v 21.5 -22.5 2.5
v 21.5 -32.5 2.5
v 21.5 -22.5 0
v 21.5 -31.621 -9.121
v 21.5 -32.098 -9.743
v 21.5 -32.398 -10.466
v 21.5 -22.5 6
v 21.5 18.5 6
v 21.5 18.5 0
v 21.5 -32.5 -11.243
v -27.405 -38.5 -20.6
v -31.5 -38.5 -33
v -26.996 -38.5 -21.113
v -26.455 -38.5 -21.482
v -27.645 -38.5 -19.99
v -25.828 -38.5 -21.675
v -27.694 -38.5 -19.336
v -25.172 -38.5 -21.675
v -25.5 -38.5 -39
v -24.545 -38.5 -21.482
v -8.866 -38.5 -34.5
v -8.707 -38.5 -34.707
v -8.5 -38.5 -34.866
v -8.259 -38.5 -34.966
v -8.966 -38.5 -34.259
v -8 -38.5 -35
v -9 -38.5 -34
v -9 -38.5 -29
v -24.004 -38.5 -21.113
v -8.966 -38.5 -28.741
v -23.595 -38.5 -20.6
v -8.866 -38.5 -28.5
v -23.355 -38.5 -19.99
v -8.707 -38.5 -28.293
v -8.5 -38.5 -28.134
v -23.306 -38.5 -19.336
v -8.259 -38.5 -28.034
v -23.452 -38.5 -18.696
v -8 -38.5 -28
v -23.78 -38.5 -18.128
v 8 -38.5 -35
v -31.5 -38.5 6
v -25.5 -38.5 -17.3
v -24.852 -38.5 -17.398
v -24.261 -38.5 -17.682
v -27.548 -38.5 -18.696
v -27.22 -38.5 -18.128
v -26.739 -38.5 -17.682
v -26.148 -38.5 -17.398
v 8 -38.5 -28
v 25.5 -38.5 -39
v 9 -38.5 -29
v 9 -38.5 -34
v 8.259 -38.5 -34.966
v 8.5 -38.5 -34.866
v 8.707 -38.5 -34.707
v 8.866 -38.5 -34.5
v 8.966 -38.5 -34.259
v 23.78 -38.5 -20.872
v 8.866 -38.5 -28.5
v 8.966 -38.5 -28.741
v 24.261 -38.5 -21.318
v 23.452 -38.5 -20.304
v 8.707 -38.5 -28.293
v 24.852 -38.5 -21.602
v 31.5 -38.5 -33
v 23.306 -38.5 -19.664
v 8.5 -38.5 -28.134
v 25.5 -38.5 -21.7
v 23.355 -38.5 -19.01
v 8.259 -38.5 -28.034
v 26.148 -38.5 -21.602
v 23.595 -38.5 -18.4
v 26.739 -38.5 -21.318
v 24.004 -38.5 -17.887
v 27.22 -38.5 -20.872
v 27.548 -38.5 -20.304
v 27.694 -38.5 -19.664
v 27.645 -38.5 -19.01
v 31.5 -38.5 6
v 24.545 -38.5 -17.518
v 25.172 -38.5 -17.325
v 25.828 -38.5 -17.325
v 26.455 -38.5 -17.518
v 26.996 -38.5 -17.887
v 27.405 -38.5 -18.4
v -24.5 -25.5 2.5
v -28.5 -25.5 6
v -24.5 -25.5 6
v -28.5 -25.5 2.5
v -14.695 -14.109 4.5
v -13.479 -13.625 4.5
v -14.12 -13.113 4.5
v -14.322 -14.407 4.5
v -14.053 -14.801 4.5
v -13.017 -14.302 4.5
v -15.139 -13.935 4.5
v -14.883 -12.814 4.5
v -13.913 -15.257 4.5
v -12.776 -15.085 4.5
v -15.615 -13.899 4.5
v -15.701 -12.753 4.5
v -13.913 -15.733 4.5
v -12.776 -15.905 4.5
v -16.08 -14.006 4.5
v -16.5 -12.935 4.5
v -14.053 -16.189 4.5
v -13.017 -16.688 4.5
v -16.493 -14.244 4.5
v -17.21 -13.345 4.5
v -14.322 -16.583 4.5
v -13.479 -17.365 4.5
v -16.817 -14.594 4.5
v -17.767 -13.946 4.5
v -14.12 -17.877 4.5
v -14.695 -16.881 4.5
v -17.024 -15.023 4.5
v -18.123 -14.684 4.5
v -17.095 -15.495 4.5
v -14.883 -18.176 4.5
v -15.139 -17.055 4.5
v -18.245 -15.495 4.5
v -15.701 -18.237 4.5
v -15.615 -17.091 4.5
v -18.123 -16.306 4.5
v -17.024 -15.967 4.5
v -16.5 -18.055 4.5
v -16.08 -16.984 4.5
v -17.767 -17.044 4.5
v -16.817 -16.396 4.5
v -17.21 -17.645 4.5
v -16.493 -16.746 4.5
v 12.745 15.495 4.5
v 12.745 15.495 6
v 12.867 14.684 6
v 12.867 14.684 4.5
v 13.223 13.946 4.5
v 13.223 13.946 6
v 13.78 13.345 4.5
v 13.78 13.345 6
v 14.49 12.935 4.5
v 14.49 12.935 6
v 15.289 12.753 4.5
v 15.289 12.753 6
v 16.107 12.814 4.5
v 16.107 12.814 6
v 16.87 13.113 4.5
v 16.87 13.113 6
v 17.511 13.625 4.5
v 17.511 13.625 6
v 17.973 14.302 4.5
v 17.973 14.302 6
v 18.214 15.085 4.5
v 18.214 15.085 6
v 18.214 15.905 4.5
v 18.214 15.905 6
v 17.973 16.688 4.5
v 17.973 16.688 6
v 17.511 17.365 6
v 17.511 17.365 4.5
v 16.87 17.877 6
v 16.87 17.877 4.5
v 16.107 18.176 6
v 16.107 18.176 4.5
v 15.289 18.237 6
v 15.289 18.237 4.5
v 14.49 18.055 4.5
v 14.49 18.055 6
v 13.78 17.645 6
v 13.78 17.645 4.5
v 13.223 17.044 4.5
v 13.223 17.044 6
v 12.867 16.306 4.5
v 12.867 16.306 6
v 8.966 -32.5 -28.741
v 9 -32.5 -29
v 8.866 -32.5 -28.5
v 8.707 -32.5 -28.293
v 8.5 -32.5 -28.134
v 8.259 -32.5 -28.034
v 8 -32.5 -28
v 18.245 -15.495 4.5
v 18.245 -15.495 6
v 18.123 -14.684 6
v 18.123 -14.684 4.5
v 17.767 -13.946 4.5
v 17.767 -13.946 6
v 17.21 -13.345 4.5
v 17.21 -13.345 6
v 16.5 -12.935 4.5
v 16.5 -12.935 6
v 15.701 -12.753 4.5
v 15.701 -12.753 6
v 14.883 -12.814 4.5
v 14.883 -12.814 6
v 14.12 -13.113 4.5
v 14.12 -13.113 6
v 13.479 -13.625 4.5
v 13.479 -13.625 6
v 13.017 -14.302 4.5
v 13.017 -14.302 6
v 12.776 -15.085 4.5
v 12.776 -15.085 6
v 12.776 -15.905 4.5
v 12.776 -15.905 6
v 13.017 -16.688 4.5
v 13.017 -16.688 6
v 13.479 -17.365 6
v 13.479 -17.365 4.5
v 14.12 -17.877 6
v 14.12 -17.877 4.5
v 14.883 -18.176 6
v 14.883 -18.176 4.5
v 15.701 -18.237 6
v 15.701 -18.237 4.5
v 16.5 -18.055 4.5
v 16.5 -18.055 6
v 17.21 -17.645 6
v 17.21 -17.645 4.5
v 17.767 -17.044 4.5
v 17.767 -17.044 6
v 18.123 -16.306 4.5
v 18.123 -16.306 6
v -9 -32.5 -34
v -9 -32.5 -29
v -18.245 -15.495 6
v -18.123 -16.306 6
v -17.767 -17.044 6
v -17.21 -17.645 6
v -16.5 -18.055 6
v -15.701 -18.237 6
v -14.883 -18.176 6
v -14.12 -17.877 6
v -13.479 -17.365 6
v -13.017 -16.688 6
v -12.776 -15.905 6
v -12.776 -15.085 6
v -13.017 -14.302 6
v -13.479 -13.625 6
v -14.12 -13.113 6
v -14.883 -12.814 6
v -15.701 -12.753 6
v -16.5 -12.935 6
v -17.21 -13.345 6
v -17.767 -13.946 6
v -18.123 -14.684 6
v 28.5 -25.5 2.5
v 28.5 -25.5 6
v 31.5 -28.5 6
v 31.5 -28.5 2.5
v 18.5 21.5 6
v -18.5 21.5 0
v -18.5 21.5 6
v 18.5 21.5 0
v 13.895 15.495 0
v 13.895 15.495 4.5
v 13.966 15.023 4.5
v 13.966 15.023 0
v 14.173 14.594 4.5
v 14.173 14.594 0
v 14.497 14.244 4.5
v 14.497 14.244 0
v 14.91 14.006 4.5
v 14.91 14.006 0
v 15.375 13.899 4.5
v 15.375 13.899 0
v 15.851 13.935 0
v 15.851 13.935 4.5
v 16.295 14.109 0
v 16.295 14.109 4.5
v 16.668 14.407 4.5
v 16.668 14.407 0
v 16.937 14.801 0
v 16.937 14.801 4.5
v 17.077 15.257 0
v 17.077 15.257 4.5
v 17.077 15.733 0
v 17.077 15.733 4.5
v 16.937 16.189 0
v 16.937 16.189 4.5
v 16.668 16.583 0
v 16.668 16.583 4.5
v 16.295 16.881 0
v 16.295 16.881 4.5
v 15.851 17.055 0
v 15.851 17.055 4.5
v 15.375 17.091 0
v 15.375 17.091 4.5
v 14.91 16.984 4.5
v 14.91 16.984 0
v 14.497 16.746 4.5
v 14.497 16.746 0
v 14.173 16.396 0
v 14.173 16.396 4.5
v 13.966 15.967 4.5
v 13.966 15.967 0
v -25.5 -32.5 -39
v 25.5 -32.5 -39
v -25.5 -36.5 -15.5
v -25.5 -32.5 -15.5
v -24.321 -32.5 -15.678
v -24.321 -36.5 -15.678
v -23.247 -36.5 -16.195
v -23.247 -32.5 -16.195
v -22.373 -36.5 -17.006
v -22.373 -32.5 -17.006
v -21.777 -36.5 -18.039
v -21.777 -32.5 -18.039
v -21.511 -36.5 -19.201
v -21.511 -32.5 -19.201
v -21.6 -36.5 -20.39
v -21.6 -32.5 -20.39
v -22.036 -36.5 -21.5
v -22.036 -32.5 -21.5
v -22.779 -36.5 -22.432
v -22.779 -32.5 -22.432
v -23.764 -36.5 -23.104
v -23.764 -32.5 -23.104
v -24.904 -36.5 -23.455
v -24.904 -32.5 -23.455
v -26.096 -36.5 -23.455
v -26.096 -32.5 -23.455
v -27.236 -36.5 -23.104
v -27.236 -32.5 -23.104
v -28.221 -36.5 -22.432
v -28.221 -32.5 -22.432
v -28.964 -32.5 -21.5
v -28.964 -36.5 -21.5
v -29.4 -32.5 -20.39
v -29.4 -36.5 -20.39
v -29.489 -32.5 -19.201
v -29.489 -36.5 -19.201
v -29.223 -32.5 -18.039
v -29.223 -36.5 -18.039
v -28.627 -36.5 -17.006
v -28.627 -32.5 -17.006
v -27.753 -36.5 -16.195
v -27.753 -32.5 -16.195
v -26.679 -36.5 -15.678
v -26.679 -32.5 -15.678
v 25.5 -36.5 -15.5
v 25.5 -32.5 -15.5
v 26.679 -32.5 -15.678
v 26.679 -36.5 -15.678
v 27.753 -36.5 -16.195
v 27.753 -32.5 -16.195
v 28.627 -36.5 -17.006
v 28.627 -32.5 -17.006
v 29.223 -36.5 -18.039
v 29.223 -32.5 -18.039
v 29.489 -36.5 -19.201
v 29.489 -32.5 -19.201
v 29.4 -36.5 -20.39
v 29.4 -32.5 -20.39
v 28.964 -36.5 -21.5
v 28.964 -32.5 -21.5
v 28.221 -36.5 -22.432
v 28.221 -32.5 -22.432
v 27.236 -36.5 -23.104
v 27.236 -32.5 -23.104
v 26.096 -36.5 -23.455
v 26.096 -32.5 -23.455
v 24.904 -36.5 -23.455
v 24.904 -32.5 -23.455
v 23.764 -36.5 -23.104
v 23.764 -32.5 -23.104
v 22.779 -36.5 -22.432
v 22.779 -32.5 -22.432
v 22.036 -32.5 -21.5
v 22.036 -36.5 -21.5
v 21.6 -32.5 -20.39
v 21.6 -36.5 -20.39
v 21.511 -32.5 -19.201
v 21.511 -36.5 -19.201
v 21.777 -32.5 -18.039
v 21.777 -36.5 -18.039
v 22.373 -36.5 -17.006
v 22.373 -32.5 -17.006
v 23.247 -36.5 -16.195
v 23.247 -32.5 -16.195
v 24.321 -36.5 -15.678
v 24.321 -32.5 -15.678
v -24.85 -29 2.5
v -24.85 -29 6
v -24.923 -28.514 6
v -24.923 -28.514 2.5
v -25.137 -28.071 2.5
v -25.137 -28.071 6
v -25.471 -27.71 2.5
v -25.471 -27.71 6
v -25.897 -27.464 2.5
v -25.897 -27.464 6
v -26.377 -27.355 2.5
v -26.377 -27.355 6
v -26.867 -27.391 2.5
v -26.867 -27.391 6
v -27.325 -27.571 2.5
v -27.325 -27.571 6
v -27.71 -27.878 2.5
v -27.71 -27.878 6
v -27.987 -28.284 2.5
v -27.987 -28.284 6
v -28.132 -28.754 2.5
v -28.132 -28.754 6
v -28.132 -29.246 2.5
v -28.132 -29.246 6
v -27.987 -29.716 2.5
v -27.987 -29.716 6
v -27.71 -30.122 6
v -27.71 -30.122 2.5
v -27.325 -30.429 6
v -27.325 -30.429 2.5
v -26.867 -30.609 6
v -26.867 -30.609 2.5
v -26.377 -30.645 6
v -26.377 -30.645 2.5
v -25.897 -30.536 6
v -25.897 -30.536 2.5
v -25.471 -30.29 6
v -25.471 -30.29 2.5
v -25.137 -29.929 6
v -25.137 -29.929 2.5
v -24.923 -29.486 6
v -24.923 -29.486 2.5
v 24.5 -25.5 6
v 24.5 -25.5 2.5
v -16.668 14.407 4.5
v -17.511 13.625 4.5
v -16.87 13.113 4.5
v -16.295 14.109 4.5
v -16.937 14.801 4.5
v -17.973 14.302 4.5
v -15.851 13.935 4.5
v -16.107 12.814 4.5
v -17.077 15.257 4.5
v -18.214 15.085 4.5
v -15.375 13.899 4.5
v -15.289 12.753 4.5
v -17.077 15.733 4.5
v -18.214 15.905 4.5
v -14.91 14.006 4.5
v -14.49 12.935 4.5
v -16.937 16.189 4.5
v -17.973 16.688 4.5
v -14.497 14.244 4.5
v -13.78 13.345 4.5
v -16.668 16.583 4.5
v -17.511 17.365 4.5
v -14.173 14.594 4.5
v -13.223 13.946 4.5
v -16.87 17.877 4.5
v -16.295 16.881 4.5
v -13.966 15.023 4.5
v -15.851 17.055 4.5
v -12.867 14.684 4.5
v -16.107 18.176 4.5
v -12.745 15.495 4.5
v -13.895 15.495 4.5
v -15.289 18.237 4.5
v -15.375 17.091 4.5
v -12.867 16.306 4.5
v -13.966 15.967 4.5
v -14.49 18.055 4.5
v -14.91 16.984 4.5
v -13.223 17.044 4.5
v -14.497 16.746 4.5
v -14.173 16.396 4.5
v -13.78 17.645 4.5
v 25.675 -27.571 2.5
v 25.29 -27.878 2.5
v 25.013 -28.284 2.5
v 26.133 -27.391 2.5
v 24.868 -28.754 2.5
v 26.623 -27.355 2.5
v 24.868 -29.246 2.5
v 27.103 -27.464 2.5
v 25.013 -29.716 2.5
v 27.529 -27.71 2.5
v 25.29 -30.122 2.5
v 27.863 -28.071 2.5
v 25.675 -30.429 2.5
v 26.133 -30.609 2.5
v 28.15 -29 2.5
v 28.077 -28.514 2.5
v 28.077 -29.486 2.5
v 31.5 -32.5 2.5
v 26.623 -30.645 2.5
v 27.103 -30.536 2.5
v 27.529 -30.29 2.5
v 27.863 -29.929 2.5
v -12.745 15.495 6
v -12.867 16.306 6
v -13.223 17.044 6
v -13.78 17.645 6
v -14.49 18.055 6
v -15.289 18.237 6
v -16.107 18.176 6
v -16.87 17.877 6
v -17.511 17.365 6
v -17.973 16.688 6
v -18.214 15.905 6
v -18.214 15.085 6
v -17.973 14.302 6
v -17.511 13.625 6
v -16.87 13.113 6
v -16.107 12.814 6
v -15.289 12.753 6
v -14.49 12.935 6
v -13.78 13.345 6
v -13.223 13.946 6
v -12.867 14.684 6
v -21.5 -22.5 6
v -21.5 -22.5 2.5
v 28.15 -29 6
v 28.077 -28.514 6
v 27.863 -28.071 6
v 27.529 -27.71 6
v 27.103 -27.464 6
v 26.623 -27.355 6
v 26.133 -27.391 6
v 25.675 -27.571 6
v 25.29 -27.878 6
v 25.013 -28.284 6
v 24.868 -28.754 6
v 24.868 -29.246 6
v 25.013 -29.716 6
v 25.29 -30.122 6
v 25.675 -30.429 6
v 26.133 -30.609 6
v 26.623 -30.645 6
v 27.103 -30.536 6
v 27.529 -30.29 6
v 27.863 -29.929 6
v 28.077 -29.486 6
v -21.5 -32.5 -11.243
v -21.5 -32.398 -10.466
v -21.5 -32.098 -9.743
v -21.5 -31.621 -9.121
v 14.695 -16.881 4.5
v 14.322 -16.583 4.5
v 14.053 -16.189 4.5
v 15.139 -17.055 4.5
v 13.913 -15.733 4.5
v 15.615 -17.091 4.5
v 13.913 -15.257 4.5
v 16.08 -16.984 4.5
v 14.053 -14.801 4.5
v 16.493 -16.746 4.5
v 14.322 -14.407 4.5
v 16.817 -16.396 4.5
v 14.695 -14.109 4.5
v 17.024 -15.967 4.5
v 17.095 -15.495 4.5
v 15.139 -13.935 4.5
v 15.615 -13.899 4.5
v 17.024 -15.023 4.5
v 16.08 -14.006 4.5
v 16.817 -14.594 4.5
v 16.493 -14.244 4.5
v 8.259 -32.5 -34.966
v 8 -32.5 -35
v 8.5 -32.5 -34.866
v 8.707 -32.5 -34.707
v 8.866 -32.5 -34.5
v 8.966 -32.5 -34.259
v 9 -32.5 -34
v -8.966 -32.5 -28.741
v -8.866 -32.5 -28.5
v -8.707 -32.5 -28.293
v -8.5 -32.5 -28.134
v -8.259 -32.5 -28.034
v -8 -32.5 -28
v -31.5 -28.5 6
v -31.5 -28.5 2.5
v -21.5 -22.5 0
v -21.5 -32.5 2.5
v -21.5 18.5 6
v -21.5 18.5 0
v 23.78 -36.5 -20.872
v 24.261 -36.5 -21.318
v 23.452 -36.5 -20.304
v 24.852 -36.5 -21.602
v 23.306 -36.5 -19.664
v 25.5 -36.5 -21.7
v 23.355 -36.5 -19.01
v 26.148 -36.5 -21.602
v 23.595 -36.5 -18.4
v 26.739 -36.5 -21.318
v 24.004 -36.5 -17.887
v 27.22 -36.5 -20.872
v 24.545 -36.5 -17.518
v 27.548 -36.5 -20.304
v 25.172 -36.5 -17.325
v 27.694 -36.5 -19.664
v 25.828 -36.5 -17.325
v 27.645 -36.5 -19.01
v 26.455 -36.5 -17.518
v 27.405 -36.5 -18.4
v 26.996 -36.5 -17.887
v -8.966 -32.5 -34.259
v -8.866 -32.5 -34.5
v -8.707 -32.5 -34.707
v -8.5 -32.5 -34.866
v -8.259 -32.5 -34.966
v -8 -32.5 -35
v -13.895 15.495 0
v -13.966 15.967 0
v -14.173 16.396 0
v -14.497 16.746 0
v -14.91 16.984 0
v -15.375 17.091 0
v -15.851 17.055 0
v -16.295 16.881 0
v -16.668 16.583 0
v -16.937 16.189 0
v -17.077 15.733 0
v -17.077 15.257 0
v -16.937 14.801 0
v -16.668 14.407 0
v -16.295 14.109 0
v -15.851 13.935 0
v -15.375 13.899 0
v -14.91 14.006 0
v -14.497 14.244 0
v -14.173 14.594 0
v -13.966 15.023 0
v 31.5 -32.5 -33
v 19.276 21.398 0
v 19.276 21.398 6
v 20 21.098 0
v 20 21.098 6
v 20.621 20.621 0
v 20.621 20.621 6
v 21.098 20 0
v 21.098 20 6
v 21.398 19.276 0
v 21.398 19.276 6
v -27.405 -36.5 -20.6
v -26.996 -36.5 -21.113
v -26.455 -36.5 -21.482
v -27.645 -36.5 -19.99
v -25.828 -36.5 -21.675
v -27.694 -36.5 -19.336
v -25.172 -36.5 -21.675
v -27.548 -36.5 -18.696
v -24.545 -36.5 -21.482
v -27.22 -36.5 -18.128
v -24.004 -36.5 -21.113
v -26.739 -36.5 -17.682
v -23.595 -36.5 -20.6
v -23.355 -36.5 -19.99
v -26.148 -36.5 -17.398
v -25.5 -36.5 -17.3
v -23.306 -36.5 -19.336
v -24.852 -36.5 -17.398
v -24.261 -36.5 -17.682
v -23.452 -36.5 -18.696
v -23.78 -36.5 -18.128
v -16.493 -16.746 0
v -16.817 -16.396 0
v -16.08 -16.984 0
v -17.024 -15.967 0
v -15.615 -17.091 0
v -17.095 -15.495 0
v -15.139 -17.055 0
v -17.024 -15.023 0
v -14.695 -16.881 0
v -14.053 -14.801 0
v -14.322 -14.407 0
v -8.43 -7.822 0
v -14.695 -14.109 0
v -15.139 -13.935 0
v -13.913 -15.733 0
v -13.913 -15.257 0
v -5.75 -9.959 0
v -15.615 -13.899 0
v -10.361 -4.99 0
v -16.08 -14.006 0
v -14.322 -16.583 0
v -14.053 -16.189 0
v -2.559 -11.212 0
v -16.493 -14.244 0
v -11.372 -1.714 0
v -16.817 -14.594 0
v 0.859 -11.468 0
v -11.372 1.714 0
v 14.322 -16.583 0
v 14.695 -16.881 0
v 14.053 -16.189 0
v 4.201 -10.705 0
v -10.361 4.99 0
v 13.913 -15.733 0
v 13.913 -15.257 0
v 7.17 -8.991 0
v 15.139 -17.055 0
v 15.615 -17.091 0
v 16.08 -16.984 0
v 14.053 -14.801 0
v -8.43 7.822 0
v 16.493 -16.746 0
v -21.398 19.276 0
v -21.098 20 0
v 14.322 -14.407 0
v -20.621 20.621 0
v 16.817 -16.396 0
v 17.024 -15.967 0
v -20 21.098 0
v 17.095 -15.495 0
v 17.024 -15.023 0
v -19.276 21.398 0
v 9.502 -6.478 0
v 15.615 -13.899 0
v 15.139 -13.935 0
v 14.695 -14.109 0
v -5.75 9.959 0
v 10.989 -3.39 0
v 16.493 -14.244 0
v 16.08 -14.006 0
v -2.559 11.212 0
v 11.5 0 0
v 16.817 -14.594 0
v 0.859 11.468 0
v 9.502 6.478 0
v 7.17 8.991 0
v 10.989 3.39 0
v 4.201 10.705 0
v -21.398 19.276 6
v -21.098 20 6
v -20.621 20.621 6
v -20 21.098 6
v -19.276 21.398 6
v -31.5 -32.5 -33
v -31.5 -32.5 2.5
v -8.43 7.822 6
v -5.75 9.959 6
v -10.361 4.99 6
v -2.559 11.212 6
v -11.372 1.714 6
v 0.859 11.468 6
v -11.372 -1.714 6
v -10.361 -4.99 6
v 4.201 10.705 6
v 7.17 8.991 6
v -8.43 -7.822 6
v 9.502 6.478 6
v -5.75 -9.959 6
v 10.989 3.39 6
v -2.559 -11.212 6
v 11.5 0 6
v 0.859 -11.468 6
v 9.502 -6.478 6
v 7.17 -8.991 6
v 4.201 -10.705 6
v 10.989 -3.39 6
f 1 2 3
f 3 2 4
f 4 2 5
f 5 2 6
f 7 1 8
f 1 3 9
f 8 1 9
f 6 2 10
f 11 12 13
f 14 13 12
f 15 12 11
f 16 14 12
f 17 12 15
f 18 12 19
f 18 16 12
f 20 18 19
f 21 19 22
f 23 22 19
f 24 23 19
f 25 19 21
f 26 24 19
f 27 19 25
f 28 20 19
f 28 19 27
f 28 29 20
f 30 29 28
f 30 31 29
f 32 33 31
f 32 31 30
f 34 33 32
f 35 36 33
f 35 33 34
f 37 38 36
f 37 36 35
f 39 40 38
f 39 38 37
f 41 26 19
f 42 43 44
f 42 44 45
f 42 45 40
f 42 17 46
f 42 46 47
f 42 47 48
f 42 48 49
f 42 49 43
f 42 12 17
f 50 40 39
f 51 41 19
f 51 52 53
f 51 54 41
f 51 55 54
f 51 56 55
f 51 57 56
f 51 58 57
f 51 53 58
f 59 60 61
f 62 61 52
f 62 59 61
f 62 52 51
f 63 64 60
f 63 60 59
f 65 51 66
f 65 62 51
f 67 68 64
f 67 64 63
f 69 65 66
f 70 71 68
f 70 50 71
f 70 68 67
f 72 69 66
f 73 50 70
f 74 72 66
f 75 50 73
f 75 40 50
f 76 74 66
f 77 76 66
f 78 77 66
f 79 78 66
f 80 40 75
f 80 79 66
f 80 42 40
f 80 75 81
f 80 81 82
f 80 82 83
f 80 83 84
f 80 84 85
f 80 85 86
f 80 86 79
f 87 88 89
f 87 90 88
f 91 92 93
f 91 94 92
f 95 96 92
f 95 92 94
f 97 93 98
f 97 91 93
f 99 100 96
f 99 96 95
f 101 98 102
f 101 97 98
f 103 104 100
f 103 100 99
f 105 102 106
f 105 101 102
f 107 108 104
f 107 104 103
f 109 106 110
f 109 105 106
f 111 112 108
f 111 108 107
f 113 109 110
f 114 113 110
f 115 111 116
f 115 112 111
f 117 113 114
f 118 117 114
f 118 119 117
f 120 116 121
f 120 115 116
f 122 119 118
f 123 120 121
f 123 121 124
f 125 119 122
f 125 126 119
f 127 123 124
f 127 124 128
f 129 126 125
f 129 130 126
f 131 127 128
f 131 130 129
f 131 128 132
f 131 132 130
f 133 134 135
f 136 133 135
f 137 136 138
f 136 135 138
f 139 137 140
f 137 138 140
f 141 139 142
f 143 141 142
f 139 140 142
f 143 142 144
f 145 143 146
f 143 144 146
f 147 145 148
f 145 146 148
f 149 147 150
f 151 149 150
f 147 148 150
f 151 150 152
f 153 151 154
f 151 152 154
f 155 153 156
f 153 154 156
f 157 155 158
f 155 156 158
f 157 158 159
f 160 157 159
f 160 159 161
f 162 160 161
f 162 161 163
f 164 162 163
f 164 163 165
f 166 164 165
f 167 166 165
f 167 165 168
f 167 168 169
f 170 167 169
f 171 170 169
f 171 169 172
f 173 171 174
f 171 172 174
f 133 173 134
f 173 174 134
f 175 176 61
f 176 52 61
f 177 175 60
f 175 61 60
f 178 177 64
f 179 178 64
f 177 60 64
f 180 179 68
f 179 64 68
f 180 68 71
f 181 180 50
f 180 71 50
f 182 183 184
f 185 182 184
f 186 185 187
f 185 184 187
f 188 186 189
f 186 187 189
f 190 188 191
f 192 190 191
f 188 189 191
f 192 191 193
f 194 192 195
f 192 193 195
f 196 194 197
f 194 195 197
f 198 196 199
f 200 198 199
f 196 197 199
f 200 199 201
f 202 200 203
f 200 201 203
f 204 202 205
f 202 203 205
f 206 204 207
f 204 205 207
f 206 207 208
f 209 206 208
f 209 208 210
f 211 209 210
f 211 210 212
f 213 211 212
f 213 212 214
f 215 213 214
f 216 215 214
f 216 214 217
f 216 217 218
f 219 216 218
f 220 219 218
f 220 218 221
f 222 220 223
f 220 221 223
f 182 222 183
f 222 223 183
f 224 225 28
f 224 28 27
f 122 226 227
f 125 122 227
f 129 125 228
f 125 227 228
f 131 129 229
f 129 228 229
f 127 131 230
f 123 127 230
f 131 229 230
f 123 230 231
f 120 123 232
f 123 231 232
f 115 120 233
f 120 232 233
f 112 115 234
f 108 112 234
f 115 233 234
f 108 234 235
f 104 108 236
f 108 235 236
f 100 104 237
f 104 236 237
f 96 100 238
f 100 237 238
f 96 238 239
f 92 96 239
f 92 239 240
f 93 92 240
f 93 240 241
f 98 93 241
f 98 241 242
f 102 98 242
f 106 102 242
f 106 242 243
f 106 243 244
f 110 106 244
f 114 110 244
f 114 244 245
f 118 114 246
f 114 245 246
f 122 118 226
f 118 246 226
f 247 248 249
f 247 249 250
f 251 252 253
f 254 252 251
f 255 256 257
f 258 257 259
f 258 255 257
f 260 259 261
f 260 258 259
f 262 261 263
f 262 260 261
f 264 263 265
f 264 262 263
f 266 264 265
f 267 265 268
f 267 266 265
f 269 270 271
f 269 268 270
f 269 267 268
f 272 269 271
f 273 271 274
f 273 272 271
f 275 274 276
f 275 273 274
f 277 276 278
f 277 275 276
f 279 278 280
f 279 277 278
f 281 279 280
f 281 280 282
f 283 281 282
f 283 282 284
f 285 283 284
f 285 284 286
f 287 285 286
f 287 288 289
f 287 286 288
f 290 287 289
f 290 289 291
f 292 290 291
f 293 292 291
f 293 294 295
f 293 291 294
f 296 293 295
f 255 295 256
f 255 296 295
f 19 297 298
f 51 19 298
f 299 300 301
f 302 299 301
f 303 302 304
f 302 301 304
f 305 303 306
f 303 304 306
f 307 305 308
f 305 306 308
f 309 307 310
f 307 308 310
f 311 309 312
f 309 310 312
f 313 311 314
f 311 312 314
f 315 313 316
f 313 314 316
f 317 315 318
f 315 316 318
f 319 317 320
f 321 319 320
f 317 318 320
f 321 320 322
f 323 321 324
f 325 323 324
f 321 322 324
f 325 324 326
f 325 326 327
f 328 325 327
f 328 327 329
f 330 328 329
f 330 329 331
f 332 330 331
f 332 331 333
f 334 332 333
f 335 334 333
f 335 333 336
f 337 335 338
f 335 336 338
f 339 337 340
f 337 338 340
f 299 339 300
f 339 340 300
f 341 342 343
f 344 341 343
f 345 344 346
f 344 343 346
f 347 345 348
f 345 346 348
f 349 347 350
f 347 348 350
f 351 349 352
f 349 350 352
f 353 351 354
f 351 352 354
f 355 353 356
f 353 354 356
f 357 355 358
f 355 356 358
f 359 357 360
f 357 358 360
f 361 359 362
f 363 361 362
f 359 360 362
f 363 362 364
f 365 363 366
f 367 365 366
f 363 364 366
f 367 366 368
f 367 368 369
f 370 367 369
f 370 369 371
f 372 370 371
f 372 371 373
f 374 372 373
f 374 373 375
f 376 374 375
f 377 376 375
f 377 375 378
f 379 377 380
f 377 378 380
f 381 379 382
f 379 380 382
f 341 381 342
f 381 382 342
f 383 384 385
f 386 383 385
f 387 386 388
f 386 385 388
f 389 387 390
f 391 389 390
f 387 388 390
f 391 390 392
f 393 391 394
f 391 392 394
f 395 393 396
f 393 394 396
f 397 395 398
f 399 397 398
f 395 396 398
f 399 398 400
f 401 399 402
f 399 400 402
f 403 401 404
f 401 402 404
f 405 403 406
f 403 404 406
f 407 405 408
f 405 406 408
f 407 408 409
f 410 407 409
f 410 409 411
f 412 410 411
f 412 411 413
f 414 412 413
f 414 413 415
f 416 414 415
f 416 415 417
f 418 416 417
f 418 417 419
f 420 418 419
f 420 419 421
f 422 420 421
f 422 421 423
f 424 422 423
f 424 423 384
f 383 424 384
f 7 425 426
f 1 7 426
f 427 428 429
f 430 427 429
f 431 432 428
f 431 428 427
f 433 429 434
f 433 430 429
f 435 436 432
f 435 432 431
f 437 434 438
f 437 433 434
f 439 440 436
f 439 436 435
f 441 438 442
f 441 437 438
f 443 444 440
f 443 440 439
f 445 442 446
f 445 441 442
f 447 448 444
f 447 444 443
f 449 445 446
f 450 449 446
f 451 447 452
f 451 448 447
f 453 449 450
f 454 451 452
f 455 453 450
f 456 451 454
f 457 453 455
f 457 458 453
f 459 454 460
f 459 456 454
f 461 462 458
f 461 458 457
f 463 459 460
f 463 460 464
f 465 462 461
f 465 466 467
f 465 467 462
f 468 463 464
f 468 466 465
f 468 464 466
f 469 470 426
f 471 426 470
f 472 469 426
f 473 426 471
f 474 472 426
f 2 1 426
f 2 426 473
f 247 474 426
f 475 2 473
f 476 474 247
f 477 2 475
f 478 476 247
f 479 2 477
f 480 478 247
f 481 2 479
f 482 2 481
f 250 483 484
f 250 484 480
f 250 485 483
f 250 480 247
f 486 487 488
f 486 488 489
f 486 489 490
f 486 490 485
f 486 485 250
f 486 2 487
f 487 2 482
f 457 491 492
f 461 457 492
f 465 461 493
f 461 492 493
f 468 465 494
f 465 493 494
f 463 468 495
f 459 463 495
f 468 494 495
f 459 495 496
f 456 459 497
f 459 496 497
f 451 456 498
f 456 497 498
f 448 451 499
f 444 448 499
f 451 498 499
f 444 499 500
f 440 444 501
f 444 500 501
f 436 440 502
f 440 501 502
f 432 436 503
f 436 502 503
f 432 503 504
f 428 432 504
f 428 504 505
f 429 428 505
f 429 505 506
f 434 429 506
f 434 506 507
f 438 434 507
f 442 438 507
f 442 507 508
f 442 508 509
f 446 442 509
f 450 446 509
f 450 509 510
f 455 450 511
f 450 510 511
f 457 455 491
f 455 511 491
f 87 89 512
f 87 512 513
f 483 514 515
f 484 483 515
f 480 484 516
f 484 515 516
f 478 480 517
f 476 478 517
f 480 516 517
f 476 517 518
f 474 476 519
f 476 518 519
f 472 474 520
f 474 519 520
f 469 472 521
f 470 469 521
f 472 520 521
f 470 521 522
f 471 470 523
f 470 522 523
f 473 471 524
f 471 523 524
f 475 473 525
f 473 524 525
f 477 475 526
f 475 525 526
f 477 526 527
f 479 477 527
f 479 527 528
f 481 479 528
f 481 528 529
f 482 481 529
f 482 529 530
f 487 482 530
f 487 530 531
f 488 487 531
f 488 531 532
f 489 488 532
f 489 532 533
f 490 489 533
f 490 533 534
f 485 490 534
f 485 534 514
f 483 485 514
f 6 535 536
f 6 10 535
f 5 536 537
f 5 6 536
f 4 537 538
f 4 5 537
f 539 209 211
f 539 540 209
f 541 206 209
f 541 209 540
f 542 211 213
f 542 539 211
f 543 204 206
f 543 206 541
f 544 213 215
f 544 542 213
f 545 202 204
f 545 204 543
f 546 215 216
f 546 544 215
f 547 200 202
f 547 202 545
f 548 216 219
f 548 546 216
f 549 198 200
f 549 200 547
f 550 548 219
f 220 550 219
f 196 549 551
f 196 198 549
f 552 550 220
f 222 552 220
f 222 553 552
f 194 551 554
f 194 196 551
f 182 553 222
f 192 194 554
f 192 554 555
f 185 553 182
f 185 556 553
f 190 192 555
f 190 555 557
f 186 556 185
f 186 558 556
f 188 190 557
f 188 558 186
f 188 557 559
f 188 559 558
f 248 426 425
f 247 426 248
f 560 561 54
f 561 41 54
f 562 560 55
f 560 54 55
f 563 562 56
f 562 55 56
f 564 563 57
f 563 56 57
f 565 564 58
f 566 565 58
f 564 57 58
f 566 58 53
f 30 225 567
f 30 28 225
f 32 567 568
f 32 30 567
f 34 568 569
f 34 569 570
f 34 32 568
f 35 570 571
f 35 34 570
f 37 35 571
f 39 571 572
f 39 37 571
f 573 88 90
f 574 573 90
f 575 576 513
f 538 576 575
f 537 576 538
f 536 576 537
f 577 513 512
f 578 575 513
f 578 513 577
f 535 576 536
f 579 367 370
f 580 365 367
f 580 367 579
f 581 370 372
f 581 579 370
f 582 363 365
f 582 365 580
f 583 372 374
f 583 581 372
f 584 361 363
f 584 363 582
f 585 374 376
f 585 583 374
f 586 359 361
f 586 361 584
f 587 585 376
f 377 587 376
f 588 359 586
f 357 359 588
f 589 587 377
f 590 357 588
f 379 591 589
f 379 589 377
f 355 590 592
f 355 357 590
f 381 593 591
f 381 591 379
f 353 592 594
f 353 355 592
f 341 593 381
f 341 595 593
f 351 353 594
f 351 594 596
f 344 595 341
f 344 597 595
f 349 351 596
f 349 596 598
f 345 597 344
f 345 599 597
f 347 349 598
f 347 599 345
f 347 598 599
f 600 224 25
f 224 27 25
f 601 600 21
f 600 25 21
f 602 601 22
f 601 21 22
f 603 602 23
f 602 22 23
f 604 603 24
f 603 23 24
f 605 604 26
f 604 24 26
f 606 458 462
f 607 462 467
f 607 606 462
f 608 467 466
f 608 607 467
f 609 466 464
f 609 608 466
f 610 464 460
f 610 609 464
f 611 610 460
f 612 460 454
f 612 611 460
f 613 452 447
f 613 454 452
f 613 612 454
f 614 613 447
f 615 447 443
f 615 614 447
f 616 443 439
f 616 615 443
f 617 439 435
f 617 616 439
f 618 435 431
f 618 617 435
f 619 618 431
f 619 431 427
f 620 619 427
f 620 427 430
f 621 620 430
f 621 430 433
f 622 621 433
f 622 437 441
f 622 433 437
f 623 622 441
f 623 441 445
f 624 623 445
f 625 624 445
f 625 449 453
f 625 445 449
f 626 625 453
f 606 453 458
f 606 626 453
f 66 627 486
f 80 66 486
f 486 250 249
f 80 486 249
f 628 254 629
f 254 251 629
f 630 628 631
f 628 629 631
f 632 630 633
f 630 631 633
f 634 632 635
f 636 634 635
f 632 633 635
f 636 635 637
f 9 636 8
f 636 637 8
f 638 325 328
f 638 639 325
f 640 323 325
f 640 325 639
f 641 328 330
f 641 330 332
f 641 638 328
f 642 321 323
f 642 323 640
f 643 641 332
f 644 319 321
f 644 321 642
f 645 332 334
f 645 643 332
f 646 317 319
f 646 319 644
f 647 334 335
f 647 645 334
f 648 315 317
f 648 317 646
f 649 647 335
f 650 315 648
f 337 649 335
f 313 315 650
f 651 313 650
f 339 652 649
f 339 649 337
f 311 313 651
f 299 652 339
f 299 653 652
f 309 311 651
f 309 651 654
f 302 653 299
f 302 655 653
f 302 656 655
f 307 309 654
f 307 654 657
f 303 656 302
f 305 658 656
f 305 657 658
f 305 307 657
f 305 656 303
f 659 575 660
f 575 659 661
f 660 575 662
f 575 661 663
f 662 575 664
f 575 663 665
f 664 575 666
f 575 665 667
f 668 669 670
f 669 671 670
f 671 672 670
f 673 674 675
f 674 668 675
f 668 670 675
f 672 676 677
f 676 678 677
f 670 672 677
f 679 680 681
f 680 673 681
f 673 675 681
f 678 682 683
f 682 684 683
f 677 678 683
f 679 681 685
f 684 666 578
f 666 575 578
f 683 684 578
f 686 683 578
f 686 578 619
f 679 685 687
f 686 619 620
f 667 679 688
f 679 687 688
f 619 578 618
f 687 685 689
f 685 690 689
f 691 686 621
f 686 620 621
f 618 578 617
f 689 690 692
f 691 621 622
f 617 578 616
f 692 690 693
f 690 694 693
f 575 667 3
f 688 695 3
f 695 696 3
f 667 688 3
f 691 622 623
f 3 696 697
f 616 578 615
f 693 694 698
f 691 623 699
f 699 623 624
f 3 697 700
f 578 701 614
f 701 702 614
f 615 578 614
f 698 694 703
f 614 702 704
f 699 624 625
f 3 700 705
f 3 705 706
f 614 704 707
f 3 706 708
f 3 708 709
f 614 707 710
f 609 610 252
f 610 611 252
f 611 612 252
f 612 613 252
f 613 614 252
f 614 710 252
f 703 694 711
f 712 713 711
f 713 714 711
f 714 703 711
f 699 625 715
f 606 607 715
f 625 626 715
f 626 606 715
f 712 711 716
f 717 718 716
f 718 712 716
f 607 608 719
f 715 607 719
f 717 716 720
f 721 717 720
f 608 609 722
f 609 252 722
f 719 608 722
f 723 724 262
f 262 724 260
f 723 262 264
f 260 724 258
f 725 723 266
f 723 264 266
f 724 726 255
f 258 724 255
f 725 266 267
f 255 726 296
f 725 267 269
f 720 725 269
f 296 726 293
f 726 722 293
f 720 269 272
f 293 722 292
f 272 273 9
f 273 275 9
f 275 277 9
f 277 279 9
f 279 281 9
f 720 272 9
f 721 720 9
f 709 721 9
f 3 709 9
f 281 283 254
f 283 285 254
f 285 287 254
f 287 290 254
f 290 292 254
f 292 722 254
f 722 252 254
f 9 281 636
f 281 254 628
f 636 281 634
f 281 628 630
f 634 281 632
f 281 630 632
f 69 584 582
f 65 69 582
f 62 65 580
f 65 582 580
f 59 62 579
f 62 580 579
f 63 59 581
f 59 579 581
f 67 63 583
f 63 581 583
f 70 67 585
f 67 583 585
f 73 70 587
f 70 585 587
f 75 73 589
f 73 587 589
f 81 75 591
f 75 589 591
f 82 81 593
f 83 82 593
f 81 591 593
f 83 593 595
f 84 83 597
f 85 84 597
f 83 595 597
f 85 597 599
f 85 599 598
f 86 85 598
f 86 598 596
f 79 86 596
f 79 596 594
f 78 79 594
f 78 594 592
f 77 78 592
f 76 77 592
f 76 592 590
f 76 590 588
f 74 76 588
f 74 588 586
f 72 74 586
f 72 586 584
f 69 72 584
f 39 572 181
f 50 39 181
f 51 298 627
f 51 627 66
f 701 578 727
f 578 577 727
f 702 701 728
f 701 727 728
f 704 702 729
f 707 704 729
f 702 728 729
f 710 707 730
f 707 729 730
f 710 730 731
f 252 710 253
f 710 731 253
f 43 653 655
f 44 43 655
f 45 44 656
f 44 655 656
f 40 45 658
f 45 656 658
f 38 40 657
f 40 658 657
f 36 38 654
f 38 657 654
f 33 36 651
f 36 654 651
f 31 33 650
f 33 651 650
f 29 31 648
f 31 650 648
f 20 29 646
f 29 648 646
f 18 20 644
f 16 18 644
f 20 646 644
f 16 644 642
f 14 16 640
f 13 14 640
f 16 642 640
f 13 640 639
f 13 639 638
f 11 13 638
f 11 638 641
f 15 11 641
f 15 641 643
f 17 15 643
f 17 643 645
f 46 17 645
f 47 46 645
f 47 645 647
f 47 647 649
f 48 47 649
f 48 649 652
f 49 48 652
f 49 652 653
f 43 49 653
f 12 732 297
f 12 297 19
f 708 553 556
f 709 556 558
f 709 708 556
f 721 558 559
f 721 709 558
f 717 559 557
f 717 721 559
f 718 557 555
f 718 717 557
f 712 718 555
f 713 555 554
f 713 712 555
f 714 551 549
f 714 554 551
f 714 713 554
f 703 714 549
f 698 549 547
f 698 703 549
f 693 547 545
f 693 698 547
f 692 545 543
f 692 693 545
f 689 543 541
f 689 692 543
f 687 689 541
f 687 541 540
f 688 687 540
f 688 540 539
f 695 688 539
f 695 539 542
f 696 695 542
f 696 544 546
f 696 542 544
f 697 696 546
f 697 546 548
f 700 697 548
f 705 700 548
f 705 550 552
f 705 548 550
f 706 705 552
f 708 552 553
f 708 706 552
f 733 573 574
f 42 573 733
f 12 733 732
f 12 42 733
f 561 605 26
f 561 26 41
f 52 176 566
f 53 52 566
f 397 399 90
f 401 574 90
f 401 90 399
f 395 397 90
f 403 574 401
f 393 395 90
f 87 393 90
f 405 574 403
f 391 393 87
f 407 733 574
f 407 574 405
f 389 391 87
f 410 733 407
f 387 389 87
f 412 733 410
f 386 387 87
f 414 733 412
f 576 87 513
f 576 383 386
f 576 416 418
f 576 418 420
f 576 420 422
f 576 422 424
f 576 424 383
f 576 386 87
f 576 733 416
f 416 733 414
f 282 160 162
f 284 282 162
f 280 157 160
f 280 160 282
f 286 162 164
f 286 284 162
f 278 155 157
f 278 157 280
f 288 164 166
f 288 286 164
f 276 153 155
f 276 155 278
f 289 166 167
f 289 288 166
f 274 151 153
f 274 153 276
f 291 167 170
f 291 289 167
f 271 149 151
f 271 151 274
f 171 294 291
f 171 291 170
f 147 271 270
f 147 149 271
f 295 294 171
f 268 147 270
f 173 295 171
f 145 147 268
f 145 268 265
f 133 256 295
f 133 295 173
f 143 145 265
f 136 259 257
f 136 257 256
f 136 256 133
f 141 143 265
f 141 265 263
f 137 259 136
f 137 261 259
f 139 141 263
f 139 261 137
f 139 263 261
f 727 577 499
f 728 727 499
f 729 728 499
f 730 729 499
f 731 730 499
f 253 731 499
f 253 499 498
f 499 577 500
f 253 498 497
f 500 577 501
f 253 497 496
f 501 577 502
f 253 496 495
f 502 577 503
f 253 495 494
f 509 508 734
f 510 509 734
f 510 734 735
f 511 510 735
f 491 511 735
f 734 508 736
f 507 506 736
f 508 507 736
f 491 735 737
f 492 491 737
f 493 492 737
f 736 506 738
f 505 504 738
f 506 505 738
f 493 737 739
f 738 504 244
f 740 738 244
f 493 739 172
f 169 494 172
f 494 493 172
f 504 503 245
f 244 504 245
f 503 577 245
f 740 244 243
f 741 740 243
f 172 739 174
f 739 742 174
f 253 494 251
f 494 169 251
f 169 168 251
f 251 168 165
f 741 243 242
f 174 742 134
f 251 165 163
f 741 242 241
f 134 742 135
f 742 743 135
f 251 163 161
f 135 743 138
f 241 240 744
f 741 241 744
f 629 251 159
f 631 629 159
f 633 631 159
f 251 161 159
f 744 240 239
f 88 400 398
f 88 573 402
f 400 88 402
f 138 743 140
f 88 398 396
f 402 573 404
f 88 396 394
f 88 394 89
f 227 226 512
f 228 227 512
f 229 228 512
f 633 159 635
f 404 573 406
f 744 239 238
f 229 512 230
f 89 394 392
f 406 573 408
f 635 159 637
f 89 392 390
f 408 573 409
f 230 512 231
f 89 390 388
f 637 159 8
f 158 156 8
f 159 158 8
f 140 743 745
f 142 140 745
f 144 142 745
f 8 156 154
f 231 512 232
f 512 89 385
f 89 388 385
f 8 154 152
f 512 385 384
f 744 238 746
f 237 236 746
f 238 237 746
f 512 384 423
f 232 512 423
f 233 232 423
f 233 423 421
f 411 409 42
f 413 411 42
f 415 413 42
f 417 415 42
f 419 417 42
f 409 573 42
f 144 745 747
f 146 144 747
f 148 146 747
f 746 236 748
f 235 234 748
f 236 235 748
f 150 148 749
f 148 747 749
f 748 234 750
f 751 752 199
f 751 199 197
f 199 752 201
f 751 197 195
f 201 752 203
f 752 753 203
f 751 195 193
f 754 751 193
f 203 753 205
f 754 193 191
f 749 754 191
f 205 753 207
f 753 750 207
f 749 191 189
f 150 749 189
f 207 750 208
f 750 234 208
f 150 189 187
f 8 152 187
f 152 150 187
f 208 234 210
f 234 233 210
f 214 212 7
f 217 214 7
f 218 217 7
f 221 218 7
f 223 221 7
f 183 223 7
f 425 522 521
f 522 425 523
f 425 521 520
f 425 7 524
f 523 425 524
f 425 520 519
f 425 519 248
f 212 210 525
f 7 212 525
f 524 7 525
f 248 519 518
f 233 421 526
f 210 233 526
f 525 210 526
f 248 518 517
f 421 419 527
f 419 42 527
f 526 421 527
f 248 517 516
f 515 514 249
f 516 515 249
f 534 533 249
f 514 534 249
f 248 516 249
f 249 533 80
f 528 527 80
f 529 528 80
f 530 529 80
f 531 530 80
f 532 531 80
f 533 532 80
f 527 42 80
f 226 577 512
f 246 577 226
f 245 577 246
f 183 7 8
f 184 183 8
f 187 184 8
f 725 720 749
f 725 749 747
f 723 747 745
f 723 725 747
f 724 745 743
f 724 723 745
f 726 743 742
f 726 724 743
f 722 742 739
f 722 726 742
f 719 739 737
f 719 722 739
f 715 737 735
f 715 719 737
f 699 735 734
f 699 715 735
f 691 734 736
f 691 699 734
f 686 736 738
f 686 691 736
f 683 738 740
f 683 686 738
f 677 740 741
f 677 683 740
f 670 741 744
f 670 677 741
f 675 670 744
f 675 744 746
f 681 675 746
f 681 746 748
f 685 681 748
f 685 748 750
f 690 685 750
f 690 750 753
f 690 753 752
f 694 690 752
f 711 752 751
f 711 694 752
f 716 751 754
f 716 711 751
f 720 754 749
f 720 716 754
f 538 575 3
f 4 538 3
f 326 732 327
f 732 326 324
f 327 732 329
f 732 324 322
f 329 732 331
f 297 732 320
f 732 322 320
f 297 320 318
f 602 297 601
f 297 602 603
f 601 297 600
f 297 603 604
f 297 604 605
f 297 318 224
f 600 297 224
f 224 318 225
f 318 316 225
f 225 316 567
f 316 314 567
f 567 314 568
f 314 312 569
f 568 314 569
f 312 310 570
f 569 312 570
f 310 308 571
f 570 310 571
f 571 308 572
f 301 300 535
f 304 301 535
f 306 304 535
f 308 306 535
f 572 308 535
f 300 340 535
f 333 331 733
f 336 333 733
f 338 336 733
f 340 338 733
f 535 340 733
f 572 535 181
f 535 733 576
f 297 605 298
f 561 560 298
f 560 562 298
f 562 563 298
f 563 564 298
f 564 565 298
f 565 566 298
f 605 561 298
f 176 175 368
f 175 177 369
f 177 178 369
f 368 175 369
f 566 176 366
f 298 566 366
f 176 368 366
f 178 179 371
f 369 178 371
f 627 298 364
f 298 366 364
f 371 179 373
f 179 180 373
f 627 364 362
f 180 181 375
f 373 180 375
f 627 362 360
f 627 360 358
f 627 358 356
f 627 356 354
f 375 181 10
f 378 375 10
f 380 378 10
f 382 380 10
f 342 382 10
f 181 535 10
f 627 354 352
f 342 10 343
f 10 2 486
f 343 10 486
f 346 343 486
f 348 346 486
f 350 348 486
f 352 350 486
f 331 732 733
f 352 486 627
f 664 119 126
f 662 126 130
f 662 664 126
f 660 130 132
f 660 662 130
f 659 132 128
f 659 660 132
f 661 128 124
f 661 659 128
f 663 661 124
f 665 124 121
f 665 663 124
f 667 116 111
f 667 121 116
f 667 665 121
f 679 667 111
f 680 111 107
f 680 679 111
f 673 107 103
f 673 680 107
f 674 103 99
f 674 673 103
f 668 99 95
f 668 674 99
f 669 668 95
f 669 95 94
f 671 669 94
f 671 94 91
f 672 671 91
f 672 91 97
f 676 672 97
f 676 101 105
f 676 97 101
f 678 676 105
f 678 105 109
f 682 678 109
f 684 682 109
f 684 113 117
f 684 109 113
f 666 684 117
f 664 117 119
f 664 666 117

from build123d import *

# Parameters (mm, degrees)
SKETCH1_W           = 43
SKETCH1_H           = 54
SKETCH1_R           = 1.6
SKETCH1_R_2         = 11.5
BOSS_EXTRUDE1_DEPTH = 6
FILLET1_R           = 3
SKETCH2_W           = 63
SKETCH2_H           = 45
BOSS_EXTRUDE2_DEPTH = 6
SKETCH3_R           = 2.2
CUT_EXTRUDE1_DEPTH  = 10
CHAMFER6_SIZE       = 10
SKETCH7_R           = 2.75
CUT_EXTRUDE4_DEPTH  = 1.5
CHAMFER11_SIZE      = 6
SKETCH13_W          = 10
SKETCH13_H          = 3.5
BOSS_EXTRUDE7_DEPTH = 7
SKETCH14_R          = 1.65
CUT_EXTRUDE5_DEPTH  = 7
SKETCH15_W          = 18
SKETCH15_H          = 7
CUT_EXTRUDE6_DEPTH  = 7
FILLET9_R           = 1
FILLET10_R          = 3
SKETCH16_R          = 4
CUT_EXTRUDE7_DEPTH  = 4
CHAMFER12_SIZE      = 3


with BuildPart() as part:
    # Sketch1 → Boss-Extrude1 (new body)
    with BuildSketch(Plane.XY):
        with Locations((0, -5.5)):
            Rectangle(SKETCH1_W, SKETCH1_H)
        with Locations((-15.495, 15.495)):
            Circle(SKETCH1_R, mode=Mode.SUBTRACT)
        with Locations(Location((15.495, 15.495, 0), (0, 0, 180))):
            Circle(SKETCH1_R, mode=Mode.SUBTRACT)
        with Locations((15.495, -15.495)):
            Circle(SKETCH1_R, mode=Mode.SUBTRACT)
        with Locations(Location((-15.495, -15.495, 0), (0, 0, 180))):
            Circle(SKETCH1_R, mode=Mode.SUBTRACT)
        Circle(SKETCH1_R_2, mode=Mode.SUBTRACT)
    extrude(amount=BOSS_EXTRUDE1_DEPTH)

    # Fillet1
    fillet1_edges = [part.edges().sort_by_distance(p)[0] for p in [
        (-21.5, 21.5, 3),
        (21.5, 21.5, 3),
    ]]
    fillet(fillet1_edges, radius=FILLET1_R)

    # Sketch2 → Boss-Extrude2 (add)
    with BuildSketch(Plane.XZ.offset(32.5)):
        with Locations((0, -16.5)):
            Rectangle(SKETCH2_W, SKETCH2_H)
    extrude(amount=BOSS_EXTRUDE2_DEPTH)

    # Sketch3 → Cut-Extrude1 (cut)
    with BuildSketch(Plane(origin=(0, -32.5, 0), x_dir=(1, 0, 0), z_dir=(0, 1, 0))):
        with Locations(Location((-25.5, 19.5, 0), (0, 0, 270))):
            Circle(SKETCH3_R)
        with Locations(Location((25.5, 19.5, 0), (0, 0, 90))):
            Circle(SKETCH3_R)
    extrude(amount=-CUT_EXTRUDE1_DEPTH, mode=Mode.SUBTRACT)

    # Chamfer6
    chamfer6_edges = [part.edges().sort_by_distance(p)[0] for p in [
        (0, -32.5, 0),
    ]]
    chamfer(chamfer6_edges, length=CHAMFER6_SIZE)

    # Sketch7 → Cut-Extrude4 (cut)
    with BuildSketch(Plane.XY.offset(6)):
        with Locations((-15.495, 15.495)):
            Circle(SKETCH7_R)
        with Locations(Location((15.495, 15.495, 0), (0, 0, 180))):
            Circle(SKETCH7_R)
        with Locations((15.495, -15.495)):
            Circle(SKETCH7_R)
        with Locations(Location((-15.495, -15.495, 0), (0, 0, 180))):
            Circle(SKETCH7_R)
    extrude(amount=-CUT_EXTRUDE4_DEPTH, mode=Mode.SUBTRACT)

    # Chamfer11
    chamfer11_edges = [part.edges().sort_by_distance(p)[0] for p in [
        (-31.5, -35.5, -39),
        (31.5, -35.5, -39),
    ]]
    chamfer(chamfer11_edges, length=CHAMFER11_SIZE)

    # Sketch13 → Boss-Extrude7 (add)
    with BuildSketch(Plane(origin=(0, -32.5, 0), x_dir=(1, 0, 0), z_dir=(0, 1, 0))):
        with Locations((-26.5, -4.25)):
            Rectangle(SKETCH13_W, SKETCH13_H)
        with Locations((26.5, -4.25)):
            Rectangle(SKETCH13_W, SKETCH13_H)
    extrude(amount=BOSS_EXTRUDE7_DEPTH)

    # Sketch14 → Cut-Extrude5 (cut)
    with BuildSketch(Plane.XY.offset(6)):
        with Locations((-26.5, -29)):
            Circle(SKETCH14_R)
        with Locations((26.5, -29)):
            Circle(SKETCH14_R)
    extrude(amount=-CUT_EXTRUDE5_DEPTH, mode=Mode.SUBTRACT)

    # Sketch15 → Cut-Extrude6 (cut)
    with BuildSketch(Plane(origin=(0, -32.5, 0), x_dir=(1, 0, 0), z_dir=(0, 1, 0))):
        with Locations((0, 31.5)):
            Rectangle(SKETCH15_W, SKETCH15_H)
    extrude(amount=-CUT_EXTRUDE6_DEPTH, mode=Mode.SUBTRACT)

    # Fillet9
    fillet9_edges = [part.edges().sort_by_distance(p)[0] for p in [
        (9, -35.5, -35),
        (9, -35.5, -28),
        (-9, -35.5, -28),
        (-9, -35.5, -35),
    ]]
    fillet(fillet9_edges, radius=FILLET9_R)

    # Fillet10
    fillet10_edges = [part.edges().sort_by_distance(p)[0] for p in [
        (0, -32.5, -10),
    ]]
    fillet(fillet10_edges, radius=FILLET10_R)

    # Sketch16 → Cut-Extrude7 (cut)
    with BuildSketch(Plane(origin=(0, -32.5, 0), x_dir=(1, 0, 0), z_dir=(0, 1, 0))):
        with Locations(Location((-25.5, 19.5, 0), (0, 0, 270))):
            Circle(SKETCH16_R)
        with Locations(Location((25.5, 19.5, 0), (0, 0, 270))):
            Circle(SKETCH16_R)
    extrude(amount=-CUT_EXTRUDE7_DEPTH, mode=Mode.SUBTRACT)

    # Chamfer12
    chamfer12_edges = [part.edges().sort_by_distance(p)[0] for p in [
        (-31.5, -25.5, 4.25),
        (-21.5, -25.5, 4.25),
        (31.5, -25.5, 4.25),
        (21.5, -25.5, 4.25),
    ]]
    chamfer(chamfer12_edges, length=CHAMFER12_SIZE)


solid = part.part
